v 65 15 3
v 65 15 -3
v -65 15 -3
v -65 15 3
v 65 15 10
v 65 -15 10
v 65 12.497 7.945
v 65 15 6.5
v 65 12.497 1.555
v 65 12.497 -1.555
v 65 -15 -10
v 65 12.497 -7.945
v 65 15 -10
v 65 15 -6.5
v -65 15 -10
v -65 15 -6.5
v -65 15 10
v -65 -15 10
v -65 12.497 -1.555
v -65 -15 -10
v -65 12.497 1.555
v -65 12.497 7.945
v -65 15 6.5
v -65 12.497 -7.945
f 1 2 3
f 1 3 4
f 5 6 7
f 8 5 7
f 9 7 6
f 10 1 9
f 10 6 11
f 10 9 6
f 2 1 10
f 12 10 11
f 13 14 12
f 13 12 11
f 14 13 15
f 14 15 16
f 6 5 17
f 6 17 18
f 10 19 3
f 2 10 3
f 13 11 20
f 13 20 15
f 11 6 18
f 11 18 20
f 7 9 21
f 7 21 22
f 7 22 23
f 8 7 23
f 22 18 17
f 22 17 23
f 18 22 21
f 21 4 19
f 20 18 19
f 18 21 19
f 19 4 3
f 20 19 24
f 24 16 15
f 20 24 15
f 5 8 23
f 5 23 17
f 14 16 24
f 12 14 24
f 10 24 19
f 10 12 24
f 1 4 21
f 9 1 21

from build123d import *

# Parameters (mm, degrees)
BOSS_EXTRUDE1_DEPTH = 65


with BuildPart() as part:
    # Sketch1 → Boss-Extrude1 (new body, symmetric)
    with BuildSketch(Plane(origin=(0, 0, 0), x_dir=(0, 0, -1), z_dir=(1, 0, 0))):
        Polygon((1.555, 12.497186583), (3, 15), (0, 15), (-3, 15), (-1.555, 12.497186583), (-7.945, 12.497186583), (-6.5, 15), (-10, 15), (-10, -15), (10, -15), (10, 15), (6.5, 15), (7.945, 12.497186583), align=None)
    extrude(amount=BOSS_EXTRUDE1_DEPTH, both=True)


solid = part.part
